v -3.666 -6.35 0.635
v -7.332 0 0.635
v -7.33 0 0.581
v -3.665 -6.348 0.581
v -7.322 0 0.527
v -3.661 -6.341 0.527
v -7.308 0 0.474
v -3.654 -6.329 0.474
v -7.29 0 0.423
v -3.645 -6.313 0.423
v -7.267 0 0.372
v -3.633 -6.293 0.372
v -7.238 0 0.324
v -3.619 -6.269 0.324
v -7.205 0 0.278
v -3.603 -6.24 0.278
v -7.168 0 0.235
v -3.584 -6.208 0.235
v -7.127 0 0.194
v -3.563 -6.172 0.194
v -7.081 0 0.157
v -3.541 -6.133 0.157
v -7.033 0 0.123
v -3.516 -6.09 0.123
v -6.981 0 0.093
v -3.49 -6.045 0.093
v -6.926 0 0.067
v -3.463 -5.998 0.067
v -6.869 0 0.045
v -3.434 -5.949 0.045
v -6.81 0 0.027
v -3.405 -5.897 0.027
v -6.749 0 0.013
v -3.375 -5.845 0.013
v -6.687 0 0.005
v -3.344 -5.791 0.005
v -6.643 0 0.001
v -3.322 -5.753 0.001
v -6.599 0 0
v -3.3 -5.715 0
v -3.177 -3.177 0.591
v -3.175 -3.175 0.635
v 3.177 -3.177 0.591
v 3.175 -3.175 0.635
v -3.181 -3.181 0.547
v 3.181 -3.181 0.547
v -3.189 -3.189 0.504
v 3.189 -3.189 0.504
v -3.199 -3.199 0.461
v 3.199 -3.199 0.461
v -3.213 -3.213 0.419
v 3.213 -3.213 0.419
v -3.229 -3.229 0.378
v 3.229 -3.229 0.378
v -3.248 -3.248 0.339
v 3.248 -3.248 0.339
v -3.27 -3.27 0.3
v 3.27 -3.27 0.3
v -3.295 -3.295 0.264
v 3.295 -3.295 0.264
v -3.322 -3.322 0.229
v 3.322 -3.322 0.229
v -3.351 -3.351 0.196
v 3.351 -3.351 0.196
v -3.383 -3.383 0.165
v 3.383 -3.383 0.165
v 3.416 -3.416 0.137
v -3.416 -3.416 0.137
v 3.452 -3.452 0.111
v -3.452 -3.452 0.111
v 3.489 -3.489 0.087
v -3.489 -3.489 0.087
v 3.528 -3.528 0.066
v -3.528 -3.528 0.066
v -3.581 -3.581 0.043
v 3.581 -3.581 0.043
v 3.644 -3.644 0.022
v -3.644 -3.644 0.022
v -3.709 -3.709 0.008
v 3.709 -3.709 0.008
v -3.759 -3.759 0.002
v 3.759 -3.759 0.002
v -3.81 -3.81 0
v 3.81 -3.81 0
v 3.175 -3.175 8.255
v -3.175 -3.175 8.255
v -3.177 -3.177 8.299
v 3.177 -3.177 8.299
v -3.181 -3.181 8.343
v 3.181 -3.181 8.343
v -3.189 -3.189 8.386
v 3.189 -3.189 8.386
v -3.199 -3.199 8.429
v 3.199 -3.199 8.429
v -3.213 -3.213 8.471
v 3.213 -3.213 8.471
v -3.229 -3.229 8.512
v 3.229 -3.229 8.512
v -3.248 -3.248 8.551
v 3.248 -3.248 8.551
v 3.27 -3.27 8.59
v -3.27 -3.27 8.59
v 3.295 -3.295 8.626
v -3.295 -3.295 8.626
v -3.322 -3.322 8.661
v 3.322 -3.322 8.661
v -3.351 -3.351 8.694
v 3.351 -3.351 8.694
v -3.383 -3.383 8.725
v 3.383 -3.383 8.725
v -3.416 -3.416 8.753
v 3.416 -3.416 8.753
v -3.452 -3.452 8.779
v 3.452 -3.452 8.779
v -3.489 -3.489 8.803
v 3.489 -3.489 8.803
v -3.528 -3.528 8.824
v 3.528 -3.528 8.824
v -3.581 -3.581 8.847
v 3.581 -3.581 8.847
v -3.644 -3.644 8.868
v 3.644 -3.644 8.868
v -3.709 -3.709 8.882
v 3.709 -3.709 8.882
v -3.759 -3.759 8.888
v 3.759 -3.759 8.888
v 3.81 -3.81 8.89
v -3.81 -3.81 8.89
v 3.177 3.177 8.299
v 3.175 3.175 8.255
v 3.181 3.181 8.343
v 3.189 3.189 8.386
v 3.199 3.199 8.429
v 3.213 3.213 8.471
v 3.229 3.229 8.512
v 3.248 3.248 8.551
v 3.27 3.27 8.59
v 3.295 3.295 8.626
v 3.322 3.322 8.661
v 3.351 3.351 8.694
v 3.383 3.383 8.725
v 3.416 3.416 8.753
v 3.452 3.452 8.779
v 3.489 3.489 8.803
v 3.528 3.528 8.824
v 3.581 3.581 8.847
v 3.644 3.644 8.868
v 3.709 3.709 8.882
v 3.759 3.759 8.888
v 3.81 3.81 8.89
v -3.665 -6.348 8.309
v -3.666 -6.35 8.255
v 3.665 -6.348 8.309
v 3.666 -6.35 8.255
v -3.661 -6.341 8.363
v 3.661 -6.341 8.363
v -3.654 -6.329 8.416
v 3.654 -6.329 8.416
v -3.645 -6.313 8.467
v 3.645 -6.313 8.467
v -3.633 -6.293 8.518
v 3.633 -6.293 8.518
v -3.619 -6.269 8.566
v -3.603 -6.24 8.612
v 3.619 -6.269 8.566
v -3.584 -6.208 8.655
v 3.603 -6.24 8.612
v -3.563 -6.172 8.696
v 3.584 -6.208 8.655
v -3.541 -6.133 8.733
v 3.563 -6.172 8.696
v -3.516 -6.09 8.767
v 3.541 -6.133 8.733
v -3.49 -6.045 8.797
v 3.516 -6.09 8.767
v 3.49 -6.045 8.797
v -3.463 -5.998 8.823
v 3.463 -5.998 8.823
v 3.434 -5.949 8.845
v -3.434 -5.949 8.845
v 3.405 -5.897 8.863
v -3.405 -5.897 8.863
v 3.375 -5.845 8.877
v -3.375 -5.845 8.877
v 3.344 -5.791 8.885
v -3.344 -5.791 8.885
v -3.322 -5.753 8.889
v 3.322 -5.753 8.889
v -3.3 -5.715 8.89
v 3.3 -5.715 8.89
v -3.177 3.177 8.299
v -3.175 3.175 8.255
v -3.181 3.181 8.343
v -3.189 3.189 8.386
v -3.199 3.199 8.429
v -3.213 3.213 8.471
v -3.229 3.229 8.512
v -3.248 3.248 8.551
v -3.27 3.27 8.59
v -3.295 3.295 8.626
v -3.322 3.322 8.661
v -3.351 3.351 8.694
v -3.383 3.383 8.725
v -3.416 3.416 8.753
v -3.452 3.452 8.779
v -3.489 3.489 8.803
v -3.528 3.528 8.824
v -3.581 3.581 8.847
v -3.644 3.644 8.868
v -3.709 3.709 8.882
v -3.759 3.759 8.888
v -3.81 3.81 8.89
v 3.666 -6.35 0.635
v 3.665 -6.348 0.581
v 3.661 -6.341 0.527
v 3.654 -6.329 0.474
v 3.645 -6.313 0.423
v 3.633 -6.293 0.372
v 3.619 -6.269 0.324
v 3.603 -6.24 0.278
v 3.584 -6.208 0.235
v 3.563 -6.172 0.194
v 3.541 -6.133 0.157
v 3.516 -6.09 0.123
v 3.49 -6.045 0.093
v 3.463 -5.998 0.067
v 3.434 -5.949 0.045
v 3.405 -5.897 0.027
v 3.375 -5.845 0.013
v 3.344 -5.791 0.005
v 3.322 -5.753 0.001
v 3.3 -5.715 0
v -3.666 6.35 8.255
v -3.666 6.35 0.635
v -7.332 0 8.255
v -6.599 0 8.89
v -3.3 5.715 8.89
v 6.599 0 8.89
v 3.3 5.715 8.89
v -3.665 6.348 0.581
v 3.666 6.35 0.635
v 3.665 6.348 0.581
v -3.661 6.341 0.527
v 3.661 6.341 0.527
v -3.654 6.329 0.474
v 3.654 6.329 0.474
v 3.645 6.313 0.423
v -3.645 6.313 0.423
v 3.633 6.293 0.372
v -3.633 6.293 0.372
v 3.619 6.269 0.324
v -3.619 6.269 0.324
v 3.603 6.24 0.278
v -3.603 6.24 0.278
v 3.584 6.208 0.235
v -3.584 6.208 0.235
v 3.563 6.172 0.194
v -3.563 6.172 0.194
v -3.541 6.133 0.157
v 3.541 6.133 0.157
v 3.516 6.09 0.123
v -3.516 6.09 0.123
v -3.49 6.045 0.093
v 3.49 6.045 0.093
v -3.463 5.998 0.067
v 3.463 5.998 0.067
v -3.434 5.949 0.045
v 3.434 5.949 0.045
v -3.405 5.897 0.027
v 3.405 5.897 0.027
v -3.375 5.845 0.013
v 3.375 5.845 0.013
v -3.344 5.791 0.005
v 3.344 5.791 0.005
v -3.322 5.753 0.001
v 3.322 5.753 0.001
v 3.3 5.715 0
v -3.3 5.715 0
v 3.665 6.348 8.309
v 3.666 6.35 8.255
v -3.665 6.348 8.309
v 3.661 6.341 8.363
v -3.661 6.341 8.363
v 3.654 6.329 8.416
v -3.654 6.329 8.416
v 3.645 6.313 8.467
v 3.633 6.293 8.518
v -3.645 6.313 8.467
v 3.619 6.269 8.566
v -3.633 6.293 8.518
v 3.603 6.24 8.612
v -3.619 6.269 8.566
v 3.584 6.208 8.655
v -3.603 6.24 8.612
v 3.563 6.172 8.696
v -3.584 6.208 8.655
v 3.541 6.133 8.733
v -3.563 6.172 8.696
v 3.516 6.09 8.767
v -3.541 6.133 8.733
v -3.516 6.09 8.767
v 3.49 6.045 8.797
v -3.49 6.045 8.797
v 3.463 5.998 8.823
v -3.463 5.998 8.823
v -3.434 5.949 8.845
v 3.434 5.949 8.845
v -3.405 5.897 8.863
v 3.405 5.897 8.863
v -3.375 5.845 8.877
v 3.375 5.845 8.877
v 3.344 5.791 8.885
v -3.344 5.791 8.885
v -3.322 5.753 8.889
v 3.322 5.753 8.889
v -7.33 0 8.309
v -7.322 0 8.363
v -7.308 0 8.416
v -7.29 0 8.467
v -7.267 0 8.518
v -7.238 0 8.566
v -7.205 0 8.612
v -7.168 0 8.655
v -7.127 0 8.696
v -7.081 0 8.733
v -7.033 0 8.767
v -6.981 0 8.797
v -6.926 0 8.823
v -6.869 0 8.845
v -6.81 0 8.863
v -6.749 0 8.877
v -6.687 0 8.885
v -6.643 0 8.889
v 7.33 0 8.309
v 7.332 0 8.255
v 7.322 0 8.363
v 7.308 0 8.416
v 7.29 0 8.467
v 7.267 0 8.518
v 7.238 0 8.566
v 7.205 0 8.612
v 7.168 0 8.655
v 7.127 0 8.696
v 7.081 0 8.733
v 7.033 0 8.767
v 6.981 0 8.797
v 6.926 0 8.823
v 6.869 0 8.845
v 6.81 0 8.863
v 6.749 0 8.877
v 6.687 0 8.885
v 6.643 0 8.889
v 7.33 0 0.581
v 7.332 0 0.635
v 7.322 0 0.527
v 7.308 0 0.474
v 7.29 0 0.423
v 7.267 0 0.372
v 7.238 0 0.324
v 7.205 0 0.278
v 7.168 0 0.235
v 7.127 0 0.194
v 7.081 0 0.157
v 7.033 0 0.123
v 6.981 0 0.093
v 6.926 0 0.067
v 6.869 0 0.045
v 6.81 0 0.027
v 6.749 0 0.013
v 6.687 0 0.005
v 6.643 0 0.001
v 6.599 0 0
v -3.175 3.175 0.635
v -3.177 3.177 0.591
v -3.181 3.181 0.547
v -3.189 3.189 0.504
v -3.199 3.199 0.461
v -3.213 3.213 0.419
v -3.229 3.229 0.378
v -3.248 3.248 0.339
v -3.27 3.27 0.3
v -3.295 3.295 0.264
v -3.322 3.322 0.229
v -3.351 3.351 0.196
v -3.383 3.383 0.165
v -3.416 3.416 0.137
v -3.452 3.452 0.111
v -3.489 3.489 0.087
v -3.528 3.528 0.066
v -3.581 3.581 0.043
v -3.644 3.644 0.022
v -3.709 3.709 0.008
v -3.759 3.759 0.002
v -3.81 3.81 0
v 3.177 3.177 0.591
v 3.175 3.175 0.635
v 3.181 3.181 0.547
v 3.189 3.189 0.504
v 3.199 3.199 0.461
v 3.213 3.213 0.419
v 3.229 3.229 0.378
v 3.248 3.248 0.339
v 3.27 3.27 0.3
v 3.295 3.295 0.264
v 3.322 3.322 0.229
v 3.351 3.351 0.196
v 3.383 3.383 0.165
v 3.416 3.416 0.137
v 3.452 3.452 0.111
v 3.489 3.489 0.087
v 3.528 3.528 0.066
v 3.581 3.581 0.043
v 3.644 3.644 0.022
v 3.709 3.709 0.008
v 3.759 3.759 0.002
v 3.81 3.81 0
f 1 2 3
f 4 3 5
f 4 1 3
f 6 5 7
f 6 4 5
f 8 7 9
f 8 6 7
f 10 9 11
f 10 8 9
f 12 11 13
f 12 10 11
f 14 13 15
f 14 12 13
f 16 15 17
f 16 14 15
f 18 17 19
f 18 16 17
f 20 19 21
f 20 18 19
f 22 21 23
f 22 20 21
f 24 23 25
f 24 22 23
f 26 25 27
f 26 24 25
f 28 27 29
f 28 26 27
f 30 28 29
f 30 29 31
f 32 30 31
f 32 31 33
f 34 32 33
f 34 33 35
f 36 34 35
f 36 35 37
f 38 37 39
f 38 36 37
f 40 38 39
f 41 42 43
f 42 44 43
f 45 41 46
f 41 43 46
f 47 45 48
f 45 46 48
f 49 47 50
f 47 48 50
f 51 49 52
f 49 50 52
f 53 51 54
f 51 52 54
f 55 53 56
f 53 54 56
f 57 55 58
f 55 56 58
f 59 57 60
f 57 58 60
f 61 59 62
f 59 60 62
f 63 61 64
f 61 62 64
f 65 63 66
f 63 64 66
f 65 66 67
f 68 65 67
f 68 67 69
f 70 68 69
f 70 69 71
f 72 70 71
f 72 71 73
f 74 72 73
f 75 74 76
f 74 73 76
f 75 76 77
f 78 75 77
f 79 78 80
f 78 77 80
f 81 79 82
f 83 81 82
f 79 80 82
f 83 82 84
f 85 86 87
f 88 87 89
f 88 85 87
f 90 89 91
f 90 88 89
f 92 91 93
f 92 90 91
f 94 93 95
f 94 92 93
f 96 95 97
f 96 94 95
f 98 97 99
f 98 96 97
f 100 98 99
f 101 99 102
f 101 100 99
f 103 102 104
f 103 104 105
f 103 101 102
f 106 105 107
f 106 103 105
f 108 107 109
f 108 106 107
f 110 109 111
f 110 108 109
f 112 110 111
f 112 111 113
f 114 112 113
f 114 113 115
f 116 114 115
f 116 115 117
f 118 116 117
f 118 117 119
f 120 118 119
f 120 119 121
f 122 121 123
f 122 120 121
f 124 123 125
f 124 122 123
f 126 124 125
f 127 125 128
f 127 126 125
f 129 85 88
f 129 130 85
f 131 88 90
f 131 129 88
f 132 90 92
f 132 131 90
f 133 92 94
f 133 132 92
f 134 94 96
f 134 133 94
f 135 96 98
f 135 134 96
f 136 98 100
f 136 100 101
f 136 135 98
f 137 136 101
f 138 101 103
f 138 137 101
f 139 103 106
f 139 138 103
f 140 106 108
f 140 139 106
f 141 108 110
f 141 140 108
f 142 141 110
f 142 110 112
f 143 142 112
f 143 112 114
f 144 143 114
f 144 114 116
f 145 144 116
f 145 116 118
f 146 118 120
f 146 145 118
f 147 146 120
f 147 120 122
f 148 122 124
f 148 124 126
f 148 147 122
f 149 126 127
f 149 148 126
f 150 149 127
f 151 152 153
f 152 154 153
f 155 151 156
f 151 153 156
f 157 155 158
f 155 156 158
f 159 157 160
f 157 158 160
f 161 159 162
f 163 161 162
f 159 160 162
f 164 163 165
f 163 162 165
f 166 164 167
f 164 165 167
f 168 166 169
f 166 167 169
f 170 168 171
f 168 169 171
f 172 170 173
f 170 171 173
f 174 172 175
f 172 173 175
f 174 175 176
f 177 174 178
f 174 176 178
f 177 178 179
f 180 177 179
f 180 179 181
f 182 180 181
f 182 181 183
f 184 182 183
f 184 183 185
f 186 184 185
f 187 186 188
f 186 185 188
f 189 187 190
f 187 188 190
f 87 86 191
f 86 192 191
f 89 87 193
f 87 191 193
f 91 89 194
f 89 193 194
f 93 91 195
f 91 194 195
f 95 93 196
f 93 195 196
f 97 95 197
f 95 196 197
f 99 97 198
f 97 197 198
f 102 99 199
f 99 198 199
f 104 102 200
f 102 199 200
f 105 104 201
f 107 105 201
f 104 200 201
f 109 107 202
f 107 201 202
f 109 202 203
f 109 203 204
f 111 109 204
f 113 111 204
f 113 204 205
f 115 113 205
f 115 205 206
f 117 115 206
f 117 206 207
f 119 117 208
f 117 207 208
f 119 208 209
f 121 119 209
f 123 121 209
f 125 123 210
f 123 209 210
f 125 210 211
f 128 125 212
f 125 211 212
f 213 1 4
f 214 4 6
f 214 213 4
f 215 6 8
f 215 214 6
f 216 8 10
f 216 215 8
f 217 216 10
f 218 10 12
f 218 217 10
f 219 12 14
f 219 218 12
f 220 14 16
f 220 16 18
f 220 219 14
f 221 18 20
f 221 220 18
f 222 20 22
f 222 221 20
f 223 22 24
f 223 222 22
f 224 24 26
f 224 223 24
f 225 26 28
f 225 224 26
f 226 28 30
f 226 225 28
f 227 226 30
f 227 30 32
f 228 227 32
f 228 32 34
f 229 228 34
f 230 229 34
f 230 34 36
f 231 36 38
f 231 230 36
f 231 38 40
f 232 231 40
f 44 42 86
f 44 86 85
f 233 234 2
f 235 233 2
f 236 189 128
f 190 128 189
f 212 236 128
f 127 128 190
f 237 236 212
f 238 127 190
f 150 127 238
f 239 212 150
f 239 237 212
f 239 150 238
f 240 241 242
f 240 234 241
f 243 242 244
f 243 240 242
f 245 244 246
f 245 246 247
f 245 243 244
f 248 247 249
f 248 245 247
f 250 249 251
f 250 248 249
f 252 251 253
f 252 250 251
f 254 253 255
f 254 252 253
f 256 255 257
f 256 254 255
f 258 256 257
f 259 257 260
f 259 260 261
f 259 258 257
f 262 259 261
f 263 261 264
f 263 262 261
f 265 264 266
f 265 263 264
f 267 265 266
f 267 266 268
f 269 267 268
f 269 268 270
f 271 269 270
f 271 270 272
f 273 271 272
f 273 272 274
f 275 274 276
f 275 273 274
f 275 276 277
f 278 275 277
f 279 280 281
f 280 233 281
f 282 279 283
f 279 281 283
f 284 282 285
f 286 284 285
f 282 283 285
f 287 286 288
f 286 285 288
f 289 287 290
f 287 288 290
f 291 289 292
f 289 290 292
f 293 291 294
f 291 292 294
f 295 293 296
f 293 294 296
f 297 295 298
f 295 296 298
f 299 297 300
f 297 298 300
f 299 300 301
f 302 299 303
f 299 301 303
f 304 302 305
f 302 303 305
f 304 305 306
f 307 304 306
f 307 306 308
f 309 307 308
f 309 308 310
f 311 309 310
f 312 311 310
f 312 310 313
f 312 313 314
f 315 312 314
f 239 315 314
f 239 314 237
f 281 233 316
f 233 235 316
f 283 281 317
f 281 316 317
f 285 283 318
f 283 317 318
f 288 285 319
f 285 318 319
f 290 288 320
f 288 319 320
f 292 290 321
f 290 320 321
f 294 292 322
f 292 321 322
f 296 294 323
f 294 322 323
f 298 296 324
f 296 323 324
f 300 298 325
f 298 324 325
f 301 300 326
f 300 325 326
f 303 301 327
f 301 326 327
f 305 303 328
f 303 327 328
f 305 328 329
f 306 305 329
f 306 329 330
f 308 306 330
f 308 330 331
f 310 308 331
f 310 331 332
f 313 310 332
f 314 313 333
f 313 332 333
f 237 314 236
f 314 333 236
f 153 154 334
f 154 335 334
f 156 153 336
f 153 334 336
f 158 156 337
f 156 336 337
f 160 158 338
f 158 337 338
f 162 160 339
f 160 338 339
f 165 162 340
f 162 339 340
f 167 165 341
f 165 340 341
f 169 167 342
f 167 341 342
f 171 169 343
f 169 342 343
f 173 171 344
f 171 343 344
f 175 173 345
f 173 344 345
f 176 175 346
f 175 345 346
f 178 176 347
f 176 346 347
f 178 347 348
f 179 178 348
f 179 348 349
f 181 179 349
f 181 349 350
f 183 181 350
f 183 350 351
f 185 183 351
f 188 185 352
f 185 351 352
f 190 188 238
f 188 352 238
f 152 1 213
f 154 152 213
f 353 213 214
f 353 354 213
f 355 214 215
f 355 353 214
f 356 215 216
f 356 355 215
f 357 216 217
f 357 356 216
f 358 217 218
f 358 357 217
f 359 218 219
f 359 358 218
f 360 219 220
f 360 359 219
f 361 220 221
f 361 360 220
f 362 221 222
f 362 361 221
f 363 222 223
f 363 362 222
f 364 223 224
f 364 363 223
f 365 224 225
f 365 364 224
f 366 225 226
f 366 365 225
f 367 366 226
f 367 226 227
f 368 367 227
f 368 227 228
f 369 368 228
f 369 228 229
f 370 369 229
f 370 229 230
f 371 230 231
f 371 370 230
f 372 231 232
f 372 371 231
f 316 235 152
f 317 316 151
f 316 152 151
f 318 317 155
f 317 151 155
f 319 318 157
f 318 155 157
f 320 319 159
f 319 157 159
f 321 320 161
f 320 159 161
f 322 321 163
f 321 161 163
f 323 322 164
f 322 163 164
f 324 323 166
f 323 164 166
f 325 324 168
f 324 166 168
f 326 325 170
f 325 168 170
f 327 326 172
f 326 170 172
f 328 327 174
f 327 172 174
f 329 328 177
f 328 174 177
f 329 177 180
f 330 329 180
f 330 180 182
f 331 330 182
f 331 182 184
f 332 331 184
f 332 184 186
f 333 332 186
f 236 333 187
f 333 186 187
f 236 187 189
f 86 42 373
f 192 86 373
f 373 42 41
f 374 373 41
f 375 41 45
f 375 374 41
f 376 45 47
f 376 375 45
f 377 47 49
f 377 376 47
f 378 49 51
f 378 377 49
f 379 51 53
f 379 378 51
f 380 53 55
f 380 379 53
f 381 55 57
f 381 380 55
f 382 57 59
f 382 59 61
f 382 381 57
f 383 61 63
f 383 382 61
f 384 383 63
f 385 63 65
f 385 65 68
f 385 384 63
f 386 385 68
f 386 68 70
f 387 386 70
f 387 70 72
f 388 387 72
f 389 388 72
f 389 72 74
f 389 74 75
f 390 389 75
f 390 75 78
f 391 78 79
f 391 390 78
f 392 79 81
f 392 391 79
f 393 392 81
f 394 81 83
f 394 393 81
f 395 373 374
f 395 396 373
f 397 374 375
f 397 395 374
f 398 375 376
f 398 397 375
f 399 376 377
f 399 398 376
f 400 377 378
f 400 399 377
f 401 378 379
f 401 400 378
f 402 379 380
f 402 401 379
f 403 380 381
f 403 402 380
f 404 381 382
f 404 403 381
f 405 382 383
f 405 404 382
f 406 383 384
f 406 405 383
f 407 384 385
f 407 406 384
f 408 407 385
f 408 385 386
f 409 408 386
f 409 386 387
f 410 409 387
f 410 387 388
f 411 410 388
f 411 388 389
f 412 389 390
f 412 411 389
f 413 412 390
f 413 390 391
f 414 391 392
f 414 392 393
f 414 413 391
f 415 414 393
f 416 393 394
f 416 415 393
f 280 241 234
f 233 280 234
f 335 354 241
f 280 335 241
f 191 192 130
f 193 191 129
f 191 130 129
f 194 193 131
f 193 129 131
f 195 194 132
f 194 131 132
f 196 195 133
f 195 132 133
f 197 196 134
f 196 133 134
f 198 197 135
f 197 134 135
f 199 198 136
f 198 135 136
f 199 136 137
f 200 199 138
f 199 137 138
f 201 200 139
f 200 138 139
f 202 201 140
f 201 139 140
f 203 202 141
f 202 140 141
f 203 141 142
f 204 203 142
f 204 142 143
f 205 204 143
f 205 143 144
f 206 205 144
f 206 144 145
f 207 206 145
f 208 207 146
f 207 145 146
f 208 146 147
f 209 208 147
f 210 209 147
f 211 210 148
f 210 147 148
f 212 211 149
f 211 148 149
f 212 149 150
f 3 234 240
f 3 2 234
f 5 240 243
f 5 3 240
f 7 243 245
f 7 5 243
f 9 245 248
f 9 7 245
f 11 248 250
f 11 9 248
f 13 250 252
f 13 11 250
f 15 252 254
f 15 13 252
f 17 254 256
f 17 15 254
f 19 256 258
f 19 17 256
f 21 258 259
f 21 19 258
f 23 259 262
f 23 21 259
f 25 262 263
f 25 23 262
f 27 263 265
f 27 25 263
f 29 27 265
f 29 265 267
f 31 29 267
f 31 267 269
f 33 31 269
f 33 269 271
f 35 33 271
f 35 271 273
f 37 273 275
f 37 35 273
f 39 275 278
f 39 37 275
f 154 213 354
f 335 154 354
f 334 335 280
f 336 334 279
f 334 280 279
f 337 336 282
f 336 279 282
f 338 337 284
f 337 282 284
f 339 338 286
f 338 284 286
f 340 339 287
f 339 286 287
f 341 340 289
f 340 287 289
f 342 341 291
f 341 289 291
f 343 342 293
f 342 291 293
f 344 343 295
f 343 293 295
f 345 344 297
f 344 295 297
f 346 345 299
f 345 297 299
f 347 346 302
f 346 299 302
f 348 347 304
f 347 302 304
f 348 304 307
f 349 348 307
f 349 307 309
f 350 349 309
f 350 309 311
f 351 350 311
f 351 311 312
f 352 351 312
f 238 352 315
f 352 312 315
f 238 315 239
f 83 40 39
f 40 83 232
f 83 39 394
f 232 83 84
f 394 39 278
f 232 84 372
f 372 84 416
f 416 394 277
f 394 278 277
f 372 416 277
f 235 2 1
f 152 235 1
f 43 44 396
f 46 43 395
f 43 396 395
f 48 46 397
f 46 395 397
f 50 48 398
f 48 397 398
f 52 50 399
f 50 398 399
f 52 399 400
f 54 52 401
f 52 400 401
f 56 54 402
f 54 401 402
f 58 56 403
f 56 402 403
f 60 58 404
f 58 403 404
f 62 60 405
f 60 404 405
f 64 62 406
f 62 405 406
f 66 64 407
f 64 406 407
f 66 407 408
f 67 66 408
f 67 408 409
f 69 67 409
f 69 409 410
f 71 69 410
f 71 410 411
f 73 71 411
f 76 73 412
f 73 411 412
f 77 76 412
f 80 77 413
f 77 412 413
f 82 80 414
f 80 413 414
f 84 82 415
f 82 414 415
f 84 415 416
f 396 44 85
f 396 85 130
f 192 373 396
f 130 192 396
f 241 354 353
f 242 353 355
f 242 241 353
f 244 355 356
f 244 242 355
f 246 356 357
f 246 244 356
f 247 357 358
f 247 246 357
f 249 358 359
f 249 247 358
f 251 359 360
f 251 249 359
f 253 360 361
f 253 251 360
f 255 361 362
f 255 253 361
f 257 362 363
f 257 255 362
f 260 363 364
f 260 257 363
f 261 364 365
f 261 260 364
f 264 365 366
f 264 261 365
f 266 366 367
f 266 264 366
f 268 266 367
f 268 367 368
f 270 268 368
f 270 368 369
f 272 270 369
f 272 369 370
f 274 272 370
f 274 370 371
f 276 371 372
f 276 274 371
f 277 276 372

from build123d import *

# Parameters (mm, degrees)
SKETCH1_W           = 6.35
SKETCH1_H           = 6.35
BOSS_EXTRUDE1_DEPTH = 8.89
FILLET1_R           = 0.635


with BuildPart() as part:
    # Sketch1 → Boss-Extrude1 (new body)
    with BuildSketch(Plane.XY):
        Polygon((7.332348419, 0), (3.666174209, 6.35), (-3.666174209, 6.35), (-7.332348419, 0), (-3.666174209, -6.35), (3.666174209, -6.35), align=None)
        Rectangle(SKETCH1_W, SKETCH1_H, mode=Mode.SUBTRACT)
    extrude(amount=BOSS_EXTRUDE1_DEPTH)

    # Fillet1
    fillet1_edges = [part.edges().sort_by_distance(p)[0] for p in [
        (0, 6.35, 8.89),
        (-5.499261314, 3.175, 8.89),
        (3.175, 0, 0),
        (0, 3.175, 0),
        (-3.175, 0, 0),
        (-5.499261314, -3.175, 8.89),
        (0, -3.175, 0),
        (3.175, 0, 8.89),
        (0, 3.175, 8.89),
        (-3.175, 0, 8.89),
        (0, -3.175, 8.89),
        (0, -6.35, 8.89),
        (5.499261314, -3.175, 8.89),
        (0, -6.35, 0),
        (-5.499261314, -3.175, 0),
        (-5.499261314, 3.175, 0),
        (0, 6.35, 0),
        (5.499261314, 3.175, 0),
        (5.499261314, -3.175, 0),
        (5.499261314, 3.175, 8.89),
    ]]
    fillet(fillet1_edges, radius=FILLET1_R)


solid = part.part
